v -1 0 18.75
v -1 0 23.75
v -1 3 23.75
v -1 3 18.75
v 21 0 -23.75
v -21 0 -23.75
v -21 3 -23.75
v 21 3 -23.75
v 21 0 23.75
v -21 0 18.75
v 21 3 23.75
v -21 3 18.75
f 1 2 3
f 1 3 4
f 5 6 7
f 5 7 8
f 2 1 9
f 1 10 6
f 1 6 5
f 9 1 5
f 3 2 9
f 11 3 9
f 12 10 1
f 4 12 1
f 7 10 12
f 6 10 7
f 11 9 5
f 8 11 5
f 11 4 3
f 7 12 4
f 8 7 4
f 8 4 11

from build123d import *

# Parameters (mm, degrees)
SKETCH1_W           = 42
SKETCH1_H           = 47.5
BOSS_EXTRUDE1_DEPTH = 3
SKETCH2_W           = 20
SKETCH2_H           = 5
CUT_EXTRUDE1_DEPTH  = 5


with BuildPart() as part:
    # Sketch1 → Boss-Extrude1 (new body)
    with BuildSketch(Plane(origin=(0, 0, 0), x_dir=(1, 0, 0), z_dir=(0, 1, 0))):
        Rectangle(SKETCH1_W, SKETCH1_H)
    extrude(amount=BOSS_EXTRUDE1_DEPTH)

    # Sketch2 → Cut-Extrude1 (cut)
    with BuildSketch(Plane(origin=(0, 0, 0), x_dir=(1, 0, 0), z_dir=(0, 1, 0))):
        with Locations((-11, -21.25)):
            Rectangle(SKETCH2_W, SKETCH2_H)
    extrude(amount=CUT_EXTRUDE1_DEPTH, mode=Mode.SUBTRACT)


solid = part.part
